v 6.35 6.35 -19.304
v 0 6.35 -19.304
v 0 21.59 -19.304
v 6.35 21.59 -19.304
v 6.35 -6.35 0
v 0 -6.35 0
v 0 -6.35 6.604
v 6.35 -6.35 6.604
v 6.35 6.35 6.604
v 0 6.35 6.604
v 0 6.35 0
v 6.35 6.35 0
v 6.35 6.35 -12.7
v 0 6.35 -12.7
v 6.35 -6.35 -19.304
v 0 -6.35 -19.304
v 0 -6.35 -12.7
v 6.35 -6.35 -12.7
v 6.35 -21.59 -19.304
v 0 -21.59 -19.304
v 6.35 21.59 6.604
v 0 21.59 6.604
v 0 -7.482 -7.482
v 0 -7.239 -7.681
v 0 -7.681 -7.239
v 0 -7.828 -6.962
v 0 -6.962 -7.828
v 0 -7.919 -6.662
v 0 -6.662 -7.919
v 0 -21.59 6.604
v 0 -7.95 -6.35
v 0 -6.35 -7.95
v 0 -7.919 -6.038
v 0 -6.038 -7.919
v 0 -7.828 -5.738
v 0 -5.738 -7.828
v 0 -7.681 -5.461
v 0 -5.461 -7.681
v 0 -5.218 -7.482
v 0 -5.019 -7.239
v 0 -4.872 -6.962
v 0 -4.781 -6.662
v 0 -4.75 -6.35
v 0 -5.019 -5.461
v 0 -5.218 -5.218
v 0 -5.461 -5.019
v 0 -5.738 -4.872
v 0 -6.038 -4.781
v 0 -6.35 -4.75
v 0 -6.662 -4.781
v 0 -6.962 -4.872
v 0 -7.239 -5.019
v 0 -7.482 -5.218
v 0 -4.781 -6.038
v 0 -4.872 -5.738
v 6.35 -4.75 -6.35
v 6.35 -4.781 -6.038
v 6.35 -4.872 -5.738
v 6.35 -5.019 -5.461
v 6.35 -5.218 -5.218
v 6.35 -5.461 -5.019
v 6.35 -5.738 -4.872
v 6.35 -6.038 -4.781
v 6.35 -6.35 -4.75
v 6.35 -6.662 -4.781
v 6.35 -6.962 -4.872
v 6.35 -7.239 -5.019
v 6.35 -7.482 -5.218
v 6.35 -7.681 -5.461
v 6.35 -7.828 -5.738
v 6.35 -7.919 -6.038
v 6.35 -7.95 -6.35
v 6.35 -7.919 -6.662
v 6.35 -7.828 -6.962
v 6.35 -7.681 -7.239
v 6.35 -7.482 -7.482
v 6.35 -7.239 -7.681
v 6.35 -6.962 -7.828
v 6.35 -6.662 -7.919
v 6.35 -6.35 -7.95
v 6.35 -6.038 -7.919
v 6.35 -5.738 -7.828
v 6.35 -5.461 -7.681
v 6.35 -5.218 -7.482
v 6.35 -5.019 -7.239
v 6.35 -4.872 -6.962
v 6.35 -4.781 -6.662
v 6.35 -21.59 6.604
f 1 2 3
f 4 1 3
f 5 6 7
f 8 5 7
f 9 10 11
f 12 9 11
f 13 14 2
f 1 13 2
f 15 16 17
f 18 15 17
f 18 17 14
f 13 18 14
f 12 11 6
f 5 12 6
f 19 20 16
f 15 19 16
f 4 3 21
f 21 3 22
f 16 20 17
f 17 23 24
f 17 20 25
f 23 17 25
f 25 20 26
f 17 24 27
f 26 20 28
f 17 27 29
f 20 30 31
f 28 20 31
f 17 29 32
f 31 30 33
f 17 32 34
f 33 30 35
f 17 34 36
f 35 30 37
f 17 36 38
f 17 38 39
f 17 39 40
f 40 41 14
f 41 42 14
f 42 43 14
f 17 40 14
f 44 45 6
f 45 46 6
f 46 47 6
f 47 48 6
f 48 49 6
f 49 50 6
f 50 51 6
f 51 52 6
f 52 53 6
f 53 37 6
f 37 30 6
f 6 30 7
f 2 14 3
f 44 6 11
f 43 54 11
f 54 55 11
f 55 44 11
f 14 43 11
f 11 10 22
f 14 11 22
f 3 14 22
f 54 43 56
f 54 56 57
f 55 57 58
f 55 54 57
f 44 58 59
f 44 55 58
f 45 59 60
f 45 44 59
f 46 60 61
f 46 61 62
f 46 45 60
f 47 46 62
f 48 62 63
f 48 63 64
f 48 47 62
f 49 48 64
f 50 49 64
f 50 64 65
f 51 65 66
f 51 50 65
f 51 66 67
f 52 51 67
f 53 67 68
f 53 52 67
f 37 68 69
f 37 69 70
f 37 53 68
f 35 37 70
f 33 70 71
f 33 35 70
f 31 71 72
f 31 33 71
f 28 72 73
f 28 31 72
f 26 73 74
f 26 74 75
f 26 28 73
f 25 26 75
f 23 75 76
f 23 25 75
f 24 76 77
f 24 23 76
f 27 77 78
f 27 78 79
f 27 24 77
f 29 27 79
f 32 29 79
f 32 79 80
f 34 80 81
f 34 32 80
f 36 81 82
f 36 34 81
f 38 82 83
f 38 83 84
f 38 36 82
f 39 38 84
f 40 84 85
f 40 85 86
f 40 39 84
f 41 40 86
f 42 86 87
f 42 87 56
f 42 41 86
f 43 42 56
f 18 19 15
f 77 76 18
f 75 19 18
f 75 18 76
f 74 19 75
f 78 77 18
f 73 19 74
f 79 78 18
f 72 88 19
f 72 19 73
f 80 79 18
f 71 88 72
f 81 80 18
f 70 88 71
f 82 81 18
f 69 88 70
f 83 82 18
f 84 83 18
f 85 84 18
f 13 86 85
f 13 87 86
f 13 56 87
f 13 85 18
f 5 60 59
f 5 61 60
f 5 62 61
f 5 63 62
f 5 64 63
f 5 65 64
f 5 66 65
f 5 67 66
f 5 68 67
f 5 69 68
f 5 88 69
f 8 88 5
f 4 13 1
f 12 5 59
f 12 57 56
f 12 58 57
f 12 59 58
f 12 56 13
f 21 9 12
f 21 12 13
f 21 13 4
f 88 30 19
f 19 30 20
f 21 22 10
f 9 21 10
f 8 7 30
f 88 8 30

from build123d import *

# Parameters (mm, degrees)
F0_R     = 1.6002
F1_DEPTH = 6.35


with BuildPart() as f1:
    # F0 (on Right) → F1 (new body)
    with BuildSketch(Plane.YZ):
        Polygon((6.35, 0), (-6.35, 0), (-6.35, 6.604), (-21.59, 6.604), (-21.59, -19.304), (-6.35, -19.304), (-6.35, -12.7), (6.35, -12.7), (6.35, -19.304), (21.59, -19.304), (21.59, 6.604), (6.35, 6.604), align=None)
        with Locations((-6.35, -6.35)):
            Circle(F0_R, mode=Mode.SUBTRACT)
    extrude(amount=F1_DEPTH)


solid = f1.part
